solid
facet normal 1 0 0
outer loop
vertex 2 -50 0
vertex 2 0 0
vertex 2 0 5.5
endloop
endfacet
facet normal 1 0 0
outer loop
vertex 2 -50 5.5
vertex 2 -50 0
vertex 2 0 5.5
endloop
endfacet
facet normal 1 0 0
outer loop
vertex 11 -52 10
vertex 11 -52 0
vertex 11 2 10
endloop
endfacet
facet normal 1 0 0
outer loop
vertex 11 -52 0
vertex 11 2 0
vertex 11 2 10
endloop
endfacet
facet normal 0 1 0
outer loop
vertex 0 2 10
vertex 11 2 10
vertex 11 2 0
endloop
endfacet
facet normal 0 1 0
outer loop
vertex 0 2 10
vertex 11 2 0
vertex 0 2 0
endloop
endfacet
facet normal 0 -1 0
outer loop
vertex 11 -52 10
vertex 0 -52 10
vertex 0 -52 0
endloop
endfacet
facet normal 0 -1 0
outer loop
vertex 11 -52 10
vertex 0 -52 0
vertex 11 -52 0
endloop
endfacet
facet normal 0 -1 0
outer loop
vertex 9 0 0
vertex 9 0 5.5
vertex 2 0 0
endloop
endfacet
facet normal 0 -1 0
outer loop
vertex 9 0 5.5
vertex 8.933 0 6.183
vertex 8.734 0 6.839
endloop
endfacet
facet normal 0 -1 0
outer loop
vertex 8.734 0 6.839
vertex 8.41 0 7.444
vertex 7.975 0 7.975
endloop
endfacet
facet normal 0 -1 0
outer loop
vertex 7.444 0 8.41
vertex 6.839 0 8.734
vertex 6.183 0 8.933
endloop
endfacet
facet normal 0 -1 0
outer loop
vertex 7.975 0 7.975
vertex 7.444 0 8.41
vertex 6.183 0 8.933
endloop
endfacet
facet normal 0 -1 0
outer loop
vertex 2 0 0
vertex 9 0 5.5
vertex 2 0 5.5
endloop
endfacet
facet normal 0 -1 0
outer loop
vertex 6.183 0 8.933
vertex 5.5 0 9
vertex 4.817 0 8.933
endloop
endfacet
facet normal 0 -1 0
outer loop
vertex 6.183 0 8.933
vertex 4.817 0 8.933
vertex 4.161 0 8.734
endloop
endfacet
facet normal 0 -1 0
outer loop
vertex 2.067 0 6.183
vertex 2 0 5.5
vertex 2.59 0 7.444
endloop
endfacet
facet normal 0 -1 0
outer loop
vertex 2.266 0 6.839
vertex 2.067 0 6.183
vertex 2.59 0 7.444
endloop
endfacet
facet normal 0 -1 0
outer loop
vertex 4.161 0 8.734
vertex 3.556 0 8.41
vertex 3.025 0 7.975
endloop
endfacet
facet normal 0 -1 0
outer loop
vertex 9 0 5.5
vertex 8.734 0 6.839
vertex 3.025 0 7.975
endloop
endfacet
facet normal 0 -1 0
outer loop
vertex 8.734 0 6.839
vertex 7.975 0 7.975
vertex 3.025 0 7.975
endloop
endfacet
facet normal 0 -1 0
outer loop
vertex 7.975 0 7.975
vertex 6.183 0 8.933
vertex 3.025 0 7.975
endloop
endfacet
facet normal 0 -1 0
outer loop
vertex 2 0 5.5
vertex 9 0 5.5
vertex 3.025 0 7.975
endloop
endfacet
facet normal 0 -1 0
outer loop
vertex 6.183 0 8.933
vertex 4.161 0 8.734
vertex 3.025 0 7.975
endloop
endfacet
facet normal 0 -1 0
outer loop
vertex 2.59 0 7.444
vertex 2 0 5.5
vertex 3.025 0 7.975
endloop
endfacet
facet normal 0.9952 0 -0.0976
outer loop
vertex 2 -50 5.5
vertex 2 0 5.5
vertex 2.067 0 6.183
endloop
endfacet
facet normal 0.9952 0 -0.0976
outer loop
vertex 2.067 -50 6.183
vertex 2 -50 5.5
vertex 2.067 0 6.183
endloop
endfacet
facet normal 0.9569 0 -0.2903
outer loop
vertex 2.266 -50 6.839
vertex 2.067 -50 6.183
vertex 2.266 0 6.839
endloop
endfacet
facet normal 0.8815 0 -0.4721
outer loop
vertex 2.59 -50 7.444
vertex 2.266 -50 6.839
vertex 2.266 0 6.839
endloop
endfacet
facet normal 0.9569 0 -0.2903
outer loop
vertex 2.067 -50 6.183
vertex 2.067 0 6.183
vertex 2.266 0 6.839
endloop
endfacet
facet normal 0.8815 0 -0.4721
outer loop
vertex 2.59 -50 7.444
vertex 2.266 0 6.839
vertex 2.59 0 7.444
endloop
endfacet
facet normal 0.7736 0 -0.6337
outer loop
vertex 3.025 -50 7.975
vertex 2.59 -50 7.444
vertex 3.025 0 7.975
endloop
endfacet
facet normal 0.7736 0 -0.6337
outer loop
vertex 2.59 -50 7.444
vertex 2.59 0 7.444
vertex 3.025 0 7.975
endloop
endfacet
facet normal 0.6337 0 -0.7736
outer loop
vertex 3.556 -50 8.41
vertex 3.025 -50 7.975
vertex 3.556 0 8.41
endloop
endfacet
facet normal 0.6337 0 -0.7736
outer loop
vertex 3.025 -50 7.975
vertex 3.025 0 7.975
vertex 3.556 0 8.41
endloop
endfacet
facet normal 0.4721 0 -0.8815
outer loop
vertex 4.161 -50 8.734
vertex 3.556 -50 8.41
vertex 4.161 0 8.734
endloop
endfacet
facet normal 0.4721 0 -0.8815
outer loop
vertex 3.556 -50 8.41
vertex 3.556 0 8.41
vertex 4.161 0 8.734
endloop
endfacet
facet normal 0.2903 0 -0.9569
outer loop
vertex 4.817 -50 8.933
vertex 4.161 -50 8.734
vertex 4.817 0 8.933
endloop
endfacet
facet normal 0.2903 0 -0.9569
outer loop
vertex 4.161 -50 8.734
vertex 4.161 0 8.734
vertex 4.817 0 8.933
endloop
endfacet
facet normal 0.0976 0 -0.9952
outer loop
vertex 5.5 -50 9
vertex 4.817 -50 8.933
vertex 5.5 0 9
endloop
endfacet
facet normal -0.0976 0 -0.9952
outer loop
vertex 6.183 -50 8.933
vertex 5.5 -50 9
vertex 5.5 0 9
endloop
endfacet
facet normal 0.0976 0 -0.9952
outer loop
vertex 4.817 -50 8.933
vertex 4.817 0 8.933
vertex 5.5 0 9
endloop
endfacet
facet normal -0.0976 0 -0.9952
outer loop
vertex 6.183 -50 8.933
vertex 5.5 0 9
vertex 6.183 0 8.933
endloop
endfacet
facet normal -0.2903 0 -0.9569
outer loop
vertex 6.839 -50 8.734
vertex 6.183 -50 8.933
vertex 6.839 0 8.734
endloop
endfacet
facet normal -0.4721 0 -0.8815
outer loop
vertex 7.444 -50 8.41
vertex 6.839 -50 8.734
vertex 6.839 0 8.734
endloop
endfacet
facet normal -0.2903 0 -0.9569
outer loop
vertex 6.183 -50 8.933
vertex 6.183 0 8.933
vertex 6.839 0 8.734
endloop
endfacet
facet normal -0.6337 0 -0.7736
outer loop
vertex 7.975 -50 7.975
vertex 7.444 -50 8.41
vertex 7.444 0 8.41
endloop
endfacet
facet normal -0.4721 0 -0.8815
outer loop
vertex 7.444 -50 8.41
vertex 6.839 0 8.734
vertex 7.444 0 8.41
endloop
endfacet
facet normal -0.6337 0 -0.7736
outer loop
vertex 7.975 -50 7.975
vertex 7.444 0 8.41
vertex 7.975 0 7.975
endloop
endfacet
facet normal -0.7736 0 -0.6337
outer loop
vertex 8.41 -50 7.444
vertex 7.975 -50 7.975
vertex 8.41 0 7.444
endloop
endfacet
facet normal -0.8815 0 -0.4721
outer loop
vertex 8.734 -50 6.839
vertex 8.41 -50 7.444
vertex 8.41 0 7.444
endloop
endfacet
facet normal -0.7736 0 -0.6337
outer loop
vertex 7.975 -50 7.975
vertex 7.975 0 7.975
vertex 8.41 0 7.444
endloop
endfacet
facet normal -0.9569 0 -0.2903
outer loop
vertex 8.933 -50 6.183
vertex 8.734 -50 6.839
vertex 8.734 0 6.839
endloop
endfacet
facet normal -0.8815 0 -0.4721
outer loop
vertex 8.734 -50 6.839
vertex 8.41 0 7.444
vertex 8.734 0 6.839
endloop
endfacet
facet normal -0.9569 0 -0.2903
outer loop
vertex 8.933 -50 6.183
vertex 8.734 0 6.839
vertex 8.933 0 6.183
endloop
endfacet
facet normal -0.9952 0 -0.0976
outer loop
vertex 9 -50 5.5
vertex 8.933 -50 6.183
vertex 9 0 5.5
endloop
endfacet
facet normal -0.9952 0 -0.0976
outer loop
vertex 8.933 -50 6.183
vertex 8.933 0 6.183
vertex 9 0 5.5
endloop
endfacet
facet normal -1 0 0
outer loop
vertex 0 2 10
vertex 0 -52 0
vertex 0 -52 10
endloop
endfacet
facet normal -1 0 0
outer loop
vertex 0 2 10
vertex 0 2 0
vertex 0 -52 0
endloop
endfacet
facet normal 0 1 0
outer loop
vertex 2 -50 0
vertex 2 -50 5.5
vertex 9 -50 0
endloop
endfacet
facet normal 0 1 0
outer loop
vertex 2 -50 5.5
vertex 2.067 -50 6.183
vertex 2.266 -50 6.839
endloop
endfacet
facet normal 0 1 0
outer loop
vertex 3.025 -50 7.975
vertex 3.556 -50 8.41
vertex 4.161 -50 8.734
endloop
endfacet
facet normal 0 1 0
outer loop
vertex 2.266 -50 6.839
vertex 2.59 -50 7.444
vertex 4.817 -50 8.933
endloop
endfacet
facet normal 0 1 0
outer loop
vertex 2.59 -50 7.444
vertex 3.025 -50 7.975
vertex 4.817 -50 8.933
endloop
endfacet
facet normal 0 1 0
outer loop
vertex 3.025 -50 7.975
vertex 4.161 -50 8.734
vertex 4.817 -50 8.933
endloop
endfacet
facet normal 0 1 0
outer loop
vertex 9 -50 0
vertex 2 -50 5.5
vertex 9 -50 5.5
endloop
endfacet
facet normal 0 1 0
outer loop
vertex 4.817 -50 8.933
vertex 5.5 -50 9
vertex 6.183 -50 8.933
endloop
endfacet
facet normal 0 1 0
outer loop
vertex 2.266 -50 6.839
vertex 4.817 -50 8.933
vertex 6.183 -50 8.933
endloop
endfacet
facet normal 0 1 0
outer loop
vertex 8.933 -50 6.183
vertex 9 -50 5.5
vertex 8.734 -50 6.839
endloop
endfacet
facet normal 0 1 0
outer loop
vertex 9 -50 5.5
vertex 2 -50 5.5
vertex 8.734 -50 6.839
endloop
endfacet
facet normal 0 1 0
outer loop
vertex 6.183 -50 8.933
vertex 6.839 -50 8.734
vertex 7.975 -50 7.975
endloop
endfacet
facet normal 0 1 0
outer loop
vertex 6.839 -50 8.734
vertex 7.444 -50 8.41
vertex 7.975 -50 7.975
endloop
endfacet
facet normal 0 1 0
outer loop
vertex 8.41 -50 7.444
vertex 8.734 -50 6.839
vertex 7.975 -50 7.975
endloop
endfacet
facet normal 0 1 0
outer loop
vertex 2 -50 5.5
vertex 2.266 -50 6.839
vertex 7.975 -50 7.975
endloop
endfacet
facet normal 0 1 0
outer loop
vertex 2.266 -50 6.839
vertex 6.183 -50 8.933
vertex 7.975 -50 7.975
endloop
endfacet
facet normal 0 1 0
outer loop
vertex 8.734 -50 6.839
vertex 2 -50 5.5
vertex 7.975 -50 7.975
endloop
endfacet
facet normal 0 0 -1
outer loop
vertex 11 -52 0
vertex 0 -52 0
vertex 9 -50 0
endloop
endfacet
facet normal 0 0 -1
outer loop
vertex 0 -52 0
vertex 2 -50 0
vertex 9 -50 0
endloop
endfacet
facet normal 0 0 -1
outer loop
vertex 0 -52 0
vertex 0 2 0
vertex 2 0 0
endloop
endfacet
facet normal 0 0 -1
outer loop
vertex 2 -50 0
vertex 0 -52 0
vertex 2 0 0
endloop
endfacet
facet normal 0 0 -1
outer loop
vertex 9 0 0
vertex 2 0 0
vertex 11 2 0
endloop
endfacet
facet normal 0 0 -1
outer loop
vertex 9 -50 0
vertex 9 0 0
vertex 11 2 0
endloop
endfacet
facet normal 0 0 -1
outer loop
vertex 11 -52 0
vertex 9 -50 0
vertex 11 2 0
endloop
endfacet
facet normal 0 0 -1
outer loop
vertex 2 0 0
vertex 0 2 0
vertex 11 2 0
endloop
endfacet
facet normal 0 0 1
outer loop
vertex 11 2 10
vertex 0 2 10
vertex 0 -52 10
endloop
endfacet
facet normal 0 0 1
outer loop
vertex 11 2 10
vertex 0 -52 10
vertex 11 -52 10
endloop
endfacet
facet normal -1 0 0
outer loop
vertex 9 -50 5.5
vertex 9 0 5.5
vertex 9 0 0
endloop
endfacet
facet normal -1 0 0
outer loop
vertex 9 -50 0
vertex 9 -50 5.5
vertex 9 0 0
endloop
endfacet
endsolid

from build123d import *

# Parameters (mm, degrees)
F1_DEPTH = 50
F2_W     = 11
F2_H     = 10
F3_DEPTH = 2
F4_W     = 11
F4_H     = 10
F5_DEPTH = 2


with BuildPart() as f1:
    # F0 (on Front) → F1 (new body)
    with BuildSketch(Plane.XZ):
        with BuildLine():
            Line((0, 10), (0, 0))
            Line((0, 0), (2, 0))
            Line((2, 0), (2, 5.5))
            ThreePointArc((2, 5.5), (5.5, 9), (9, 5.5))
            Line((9, 5.5), (9, 0))
            Line((9, 0), (11, 0))
            Line((11, 0), (11, 10))
            Line((11, 10), (0, 10))
        make_face()
    extrude(amount=F1_DEPTH)

    # F2 (on face) → F3 (join)
    with BuildSketch(Plane(origin=(0, 0, 0), x_dir=(-1, 0, 0), z_dir=(0, 1, 0))):
        with Locations((-5.5, 5)):
            Rectangle(F2_W, F2_H)
    extrude(amount=F3_DEPTH)

    # F4 (on face) → F5 (join)
    with BuildSketch(Plane.XZ.offset(50)):
        with Locations((5.5, 5)):
            Rectangle(F4_W, F4_H)
    extrude(amount=F5_DEPTH)


solid = f1.part
